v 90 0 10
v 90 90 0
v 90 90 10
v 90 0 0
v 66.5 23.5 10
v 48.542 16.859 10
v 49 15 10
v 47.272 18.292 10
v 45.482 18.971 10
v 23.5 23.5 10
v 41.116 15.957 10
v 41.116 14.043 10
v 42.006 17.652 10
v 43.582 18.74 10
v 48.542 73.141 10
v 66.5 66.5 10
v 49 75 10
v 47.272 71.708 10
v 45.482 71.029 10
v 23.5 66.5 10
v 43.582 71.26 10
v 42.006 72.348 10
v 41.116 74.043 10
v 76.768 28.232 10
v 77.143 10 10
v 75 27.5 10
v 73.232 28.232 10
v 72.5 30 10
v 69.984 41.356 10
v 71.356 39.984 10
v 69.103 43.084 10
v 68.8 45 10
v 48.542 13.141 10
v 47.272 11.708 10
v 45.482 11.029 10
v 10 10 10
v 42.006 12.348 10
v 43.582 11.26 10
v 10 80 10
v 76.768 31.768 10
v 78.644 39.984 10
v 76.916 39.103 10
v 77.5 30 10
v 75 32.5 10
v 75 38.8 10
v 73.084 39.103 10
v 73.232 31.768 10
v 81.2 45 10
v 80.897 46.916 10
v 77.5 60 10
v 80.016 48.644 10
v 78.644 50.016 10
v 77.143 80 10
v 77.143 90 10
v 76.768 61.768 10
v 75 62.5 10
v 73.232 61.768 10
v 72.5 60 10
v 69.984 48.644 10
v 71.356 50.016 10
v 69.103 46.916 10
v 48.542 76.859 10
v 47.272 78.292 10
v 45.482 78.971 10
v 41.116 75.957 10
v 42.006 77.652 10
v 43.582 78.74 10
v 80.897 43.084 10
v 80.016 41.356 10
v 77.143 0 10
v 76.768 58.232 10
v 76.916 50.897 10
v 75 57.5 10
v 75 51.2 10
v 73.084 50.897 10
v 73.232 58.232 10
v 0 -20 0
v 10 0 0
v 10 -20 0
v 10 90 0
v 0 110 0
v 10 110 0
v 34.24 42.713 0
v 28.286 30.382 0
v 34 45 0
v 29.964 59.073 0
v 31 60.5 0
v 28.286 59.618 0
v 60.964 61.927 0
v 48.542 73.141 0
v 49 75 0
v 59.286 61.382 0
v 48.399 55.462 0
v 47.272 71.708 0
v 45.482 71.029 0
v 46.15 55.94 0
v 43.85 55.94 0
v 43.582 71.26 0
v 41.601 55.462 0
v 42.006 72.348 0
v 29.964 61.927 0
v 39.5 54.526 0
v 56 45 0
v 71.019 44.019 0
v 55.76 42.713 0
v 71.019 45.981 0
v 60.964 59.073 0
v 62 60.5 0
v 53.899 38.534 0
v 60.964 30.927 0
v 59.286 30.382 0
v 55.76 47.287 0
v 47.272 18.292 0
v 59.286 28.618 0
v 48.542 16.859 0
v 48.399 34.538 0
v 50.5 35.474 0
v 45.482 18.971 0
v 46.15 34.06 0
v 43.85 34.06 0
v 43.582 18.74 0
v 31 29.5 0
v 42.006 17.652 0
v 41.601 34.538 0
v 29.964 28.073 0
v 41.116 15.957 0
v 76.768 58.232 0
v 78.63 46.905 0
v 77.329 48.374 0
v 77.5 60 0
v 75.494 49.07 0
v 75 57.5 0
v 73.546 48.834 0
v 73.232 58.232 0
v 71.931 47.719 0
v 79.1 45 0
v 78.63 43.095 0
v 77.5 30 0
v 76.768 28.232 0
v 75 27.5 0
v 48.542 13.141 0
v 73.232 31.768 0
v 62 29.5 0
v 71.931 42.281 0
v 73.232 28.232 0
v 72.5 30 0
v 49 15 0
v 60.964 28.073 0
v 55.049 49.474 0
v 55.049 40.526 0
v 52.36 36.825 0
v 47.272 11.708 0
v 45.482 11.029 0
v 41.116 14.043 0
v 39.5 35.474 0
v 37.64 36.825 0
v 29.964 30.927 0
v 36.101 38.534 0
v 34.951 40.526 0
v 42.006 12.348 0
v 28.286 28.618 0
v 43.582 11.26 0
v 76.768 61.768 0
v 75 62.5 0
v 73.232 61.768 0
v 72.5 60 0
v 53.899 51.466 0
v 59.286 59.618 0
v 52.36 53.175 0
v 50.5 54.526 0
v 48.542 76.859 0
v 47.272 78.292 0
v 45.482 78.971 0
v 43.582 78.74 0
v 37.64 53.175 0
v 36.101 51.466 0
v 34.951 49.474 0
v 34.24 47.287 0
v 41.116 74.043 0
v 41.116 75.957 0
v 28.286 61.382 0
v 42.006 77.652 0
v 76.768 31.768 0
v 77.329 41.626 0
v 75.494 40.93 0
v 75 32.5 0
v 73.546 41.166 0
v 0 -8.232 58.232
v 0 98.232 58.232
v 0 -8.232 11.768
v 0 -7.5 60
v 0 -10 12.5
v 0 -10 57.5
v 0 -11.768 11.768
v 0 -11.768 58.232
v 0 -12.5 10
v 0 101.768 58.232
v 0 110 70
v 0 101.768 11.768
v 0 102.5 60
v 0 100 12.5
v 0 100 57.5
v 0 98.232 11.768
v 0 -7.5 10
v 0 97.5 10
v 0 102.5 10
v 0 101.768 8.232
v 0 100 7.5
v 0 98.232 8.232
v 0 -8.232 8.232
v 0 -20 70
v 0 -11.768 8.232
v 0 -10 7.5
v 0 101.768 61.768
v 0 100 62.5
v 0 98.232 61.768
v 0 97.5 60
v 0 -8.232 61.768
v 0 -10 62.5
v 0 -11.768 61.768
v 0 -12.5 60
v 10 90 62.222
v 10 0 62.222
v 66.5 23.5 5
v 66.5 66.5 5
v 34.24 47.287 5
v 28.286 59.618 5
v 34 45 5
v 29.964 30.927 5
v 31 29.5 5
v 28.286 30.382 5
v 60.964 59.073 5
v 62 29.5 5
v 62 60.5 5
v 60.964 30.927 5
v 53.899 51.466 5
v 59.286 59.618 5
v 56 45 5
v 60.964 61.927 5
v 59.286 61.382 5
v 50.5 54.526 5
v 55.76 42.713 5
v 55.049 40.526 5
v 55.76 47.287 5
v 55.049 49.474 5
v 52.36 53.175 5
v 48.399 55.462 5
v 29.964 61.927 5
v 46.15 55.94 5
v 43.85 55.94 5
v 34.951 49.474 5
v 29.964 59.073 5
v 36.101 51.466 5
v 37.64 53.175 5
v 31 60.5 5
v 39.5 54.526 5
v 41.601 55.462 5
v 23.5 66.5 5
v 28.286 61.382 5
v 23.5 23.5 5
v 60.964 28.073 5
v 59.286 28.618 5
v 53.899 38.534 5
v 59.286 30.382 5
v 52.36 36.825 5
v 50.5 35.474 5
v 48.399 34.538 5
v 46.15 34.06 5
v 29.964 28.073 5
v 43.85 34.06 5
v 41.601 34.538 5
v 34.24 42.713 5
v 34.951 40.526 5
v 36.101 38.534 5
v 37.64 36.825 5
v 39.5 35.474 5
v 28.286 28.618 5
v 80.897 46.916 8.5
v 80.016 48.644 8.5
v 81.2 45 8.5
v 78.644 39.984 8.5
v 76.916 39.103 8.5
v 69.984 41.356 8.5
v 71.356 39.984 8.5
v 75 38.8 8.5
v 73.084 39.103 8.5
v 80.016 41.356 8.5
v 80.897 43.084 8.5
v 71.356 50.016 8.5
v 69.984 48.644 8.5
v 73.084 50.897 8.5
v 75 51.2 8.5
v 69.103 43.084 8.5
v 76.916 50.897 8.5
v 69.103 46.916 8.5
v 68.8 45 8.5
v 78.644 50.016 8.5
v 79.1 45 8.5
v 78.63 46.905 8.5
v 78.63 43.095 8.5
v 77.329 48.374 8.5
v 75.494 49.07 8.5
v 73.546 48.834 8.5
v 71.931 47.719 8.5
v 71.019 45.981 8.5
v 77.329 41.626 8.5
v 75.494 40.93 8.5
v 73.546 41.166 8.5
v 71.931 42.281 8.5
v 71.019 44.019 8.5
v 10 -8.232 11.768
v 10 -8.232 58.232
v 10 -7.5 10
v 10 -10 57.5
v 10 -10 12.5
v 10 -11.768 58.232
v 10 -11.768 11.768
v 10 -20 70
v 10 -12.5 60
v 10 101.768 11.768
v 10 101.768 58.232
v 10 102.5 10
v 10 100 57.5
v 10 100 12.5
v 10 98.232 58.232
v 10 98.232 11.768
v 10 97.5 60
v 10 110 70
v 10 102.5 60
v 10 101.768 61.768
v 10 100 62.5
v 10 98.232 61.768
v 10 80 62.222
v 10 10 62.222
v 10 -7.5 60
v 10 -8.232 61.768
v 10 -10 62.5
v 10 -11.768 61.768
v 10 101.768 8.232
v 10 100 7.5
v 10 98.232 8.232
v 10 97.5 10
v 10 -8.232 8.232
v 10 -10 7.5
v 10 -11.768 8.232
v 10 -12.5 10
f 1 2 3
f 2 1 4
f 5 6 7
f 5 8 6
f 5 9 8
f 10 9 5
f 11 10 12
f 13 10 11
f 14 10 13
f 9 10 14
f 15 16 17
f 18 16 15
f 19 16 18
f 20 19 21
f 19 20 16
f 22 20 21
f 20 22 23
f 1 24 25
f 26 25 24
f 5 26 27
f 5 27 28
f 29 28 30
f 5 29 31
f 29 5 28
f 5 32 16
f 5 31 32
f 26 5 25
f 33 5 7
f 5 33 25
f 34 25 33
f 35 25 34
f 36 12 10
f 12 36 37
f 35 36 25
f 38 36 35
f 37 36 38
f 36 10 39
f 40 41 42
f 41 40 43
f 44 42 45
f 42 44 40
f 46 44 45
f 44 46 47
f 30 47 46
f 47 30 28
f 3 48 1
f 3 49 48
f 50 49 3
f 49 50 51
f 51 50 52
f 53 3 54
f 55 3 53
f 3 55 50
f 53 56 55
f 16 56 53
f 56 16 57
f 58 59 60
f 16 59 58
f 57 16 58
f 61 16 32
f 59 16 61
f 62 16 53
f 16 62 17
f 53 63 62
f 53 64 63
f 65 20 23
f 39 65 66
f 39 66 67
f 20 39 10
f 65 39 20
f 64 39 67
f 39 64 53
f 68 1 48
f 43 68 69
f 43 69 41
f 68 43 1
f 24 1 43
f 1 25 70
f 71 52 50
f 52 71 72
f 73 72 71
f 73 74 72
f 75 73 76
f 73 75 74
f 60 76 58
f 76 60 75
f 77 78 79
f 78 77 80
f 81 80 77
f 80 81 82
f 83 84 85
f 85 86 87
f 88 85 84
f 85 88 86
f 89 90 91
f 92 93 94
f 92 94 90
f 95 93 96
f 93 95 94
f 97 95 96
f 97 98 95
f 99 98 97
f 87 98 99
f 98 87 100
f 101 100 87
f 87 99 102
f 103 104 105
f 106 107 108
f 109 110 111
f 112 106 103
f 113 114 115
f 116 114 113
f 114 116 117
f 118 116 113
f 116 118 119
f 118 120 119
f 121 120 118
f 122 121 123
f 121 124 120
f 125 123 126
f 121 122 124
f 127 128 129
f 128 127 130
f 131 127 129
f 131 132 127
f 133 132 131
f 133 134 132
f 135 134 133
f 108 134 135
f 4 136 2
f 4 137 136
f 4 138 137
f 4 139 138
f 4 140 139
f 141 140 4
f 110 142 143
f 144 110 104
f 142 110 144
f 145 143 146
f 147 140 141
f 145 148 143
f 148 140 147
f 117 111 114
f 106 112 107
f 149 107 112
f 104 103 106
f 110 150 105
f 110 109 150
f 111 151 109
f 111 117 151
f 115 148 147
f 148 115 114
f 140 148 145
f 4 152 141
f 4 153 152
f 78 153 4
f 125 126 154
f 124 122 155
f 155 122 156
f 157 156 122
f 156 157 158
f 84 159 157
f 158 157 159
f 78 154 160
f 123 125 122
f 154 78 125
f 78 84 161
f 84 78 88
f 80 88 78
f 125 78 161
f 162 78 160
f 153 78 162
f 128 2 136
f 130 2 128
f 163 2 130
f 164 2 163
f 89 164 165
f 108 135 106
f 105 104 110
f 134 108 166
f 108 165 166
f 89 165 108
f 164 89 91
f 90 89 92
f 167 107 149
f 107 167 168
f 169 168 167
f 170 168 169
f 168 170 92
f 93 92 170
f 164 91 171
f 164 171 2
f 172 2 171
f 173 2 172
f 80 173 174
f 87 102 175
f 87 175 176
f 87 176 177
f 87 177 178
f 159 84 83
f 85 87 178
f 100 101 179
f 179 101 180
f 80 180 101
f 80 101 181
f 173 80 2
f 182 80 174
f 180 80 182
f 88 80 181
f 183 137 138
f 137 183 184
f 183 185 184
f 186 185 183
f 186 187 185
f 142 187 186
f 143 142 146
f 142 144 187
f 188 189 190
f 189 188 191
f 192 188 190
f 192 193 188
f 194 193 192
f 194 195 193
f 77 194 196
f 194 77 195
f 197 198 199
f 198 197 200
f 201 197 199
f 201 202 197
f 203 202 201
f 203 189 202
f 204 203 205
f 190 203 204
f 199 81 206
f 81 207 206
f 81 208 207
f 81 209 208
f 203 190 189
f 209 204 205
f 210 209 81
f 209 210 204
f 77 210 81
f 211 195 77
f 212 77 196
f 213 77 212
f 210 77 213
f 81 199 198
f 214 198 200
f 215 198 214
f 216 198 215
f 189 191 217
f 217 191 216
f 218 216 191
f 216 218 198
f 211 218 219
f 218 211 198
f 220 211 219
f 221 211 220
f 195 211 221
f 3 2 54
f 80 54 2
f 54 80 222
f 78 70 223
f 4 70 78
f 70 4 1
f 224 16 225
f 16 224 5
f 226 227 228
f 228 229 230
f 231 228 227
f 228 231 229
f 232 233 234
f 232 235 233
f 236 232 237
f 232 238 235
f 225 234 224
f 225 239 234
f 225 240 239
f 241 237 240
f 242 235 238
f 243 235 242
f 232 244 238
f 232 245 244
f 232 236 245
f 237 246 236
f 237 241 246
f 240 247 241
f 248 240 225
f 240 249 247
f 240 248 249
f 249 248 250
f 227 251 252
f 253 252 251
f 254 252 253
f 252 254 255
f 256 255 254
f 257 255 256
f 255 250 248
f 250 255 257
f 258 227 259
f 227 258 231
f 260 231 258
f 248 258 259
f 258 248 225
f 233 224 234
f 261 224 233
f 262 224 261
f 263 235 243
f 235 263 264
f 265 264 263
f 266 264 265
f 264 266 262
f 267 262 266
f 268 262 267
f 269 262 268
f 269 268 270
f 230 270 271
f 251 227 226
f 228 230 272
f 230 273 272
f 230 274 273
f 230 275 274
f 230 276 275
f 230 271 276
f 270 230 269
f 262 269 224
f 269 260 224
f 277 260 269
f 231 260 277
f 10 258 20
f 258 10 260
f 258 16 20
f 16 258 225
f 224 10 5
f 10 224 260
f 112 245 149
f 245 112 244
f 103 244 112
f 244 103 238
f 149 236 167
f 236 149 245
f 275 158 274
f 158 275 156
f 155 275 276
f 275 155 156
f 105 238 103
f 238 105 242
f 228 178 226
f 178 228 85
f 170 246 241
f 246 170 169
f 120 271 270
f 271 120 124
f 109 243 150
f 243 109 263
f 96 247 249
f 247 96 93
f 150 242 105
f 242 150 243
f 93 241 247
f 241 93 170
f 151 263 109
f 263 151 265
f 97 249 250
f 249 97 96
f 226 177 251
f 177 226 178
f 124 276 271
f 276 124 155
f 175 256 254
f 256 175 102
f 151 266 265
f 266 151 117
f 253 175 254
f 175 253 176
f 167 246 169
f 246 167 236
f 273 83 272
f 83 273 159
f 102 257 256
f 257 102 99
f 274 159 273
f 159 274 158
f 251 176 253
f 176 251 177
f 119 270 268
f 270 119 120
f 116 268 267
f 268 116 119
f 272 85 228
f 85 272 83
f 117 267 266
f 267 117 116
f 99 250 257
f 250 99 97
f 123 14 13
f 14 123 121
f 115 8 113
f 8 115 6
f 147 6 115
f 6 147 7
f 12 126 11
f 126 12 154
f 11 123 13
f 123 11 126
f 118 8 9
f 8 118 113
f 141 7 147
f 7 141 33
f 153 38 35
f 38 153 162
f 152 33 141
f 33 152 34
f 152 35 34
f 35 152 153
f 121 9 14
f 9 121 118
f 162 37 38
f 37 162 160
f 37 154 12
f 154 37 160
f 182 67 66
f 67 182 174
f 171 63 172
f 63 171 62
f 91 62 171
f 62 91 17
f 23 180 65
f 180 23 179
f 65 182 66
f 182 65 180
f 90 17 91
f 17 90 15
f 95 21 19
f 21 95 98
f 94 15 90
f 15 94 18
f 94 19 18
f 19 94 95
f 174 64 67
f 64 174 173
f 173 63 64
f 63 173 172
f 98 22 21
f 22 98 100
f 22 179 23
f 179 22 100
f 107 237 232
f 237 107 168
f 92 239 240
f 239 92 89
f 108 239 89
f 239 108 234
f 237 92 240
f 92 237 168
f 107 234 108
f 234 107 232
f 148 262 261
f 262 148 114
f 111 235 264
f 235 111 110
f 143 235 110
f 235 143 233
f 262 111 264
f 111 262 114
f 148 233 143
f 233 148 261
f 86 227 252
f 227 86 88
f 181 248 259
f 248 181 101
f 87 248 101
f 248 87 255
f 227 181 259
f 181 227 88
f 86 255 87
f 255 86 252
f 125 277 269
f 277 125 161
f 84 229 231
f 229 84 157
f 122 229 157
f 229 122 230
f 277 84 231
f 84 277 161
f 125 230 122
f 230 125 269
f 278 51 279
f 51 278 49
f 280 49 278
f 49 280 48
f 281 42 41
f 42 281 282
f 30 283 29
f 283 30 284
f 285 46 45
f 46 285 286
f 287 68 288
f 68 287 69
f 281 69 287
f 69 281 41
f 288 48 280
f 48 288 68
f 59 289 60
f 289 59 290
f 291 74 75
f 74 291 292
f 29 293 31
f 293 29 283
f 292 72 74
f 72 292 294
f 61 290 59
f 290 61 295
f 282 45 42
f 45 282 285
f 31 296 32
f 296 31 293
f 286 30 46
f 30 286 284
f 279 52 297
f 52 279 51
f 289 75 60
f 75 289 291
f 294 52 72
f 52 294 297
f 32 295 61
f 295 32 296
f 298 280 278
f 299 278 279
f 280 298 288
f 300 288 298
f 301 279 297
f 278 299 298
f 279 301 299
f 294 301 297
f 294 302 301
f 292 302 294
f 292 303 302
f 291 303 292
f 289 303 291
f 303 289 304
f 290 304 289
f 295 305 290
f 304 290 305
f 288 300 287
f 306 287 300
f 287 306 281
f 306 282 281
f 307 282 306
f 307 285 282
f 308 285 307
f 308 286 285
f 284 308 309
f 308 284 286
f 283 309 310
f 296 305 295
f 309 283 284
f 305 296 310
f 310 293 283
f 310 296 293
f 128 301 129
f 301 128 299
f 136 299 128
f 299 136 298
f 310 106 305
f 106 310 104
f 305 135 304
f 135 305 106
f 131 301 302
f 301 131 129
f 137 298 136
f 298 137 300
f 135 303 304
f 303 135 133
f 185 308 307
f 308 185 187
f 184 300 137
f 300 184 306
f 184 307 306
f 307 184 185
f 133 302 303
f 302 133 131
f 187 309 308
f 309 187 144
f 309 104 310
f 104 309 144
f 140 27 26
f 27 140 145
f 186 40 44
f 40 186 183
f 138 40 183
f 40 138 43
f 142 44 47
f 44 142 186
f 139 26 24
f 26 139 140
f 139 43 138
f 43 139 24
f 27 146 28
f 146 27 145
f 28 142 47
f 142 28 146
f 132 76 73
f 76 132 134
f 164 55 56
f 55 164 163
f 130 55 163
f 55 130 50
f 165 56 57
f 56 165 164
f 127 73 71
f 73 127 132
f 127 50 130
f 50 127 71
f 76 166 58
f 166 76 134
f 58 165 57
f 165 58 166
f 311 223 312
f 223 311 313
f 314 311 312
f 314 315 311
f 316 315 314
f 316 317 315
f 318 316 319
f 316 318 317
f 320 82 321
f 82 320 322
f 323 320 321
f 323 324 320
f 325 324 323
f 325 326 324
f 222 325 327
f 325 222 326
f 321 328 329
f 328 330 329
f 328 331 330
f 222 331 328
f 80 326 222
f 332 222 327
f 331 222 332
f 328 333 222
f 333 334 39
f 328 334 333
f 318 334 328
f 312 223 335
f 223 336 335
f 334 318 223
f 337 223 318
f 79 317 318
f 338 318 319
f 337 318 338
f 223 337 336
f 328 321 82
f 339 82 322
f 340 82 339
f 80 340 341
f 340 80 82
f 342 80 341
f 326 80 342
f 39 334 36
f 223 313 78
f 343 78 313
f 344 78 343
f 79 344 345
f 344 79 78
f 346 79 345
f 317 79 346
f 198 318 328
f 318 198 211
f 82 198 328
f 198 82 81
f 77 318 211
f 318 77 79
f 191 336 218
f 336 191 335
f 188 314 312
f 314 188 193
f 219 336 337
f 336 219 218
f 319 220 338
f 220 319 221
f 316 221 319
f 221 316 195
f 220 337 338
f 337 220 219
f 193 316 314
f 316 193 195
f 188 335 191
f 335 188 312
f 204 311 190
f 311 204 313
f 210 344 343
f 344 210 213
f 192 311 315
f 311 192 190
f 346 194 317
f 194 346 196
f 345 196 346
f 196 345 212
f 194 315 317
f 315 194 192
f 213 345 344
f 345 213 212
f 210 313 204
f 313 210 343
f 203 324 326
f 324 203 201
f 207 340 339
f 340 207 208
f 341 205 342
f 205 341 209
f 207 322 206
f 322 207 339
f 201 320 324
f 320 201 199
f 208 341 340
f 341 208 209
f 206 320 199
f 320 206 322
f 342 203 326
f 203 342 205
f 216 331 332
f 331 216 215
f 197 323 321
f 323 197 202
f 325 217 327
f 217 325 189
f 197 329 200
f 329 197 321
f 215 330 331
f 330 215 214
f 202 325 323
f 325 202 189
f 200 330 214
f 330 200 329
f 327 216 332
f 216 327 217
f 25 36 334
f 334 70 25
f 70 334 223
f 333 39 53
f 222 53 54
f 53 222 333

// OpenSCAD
distscr=31/2;
cent=45;
rodrad=4;

difference(){
cube(size = [2*cent,2*cent,10], center =false);

translate(v=[cent-43/2,cent-43/2,5])
cube(size = [43,43,5], center =false);

translate(v=[cent,cent,0])
cylinder(h=5, r=11, center=false);

translate(v=[cent,15,0])
cylinder(h=20, r=rodrad, center=false);

translate(v=[cent,2*cent-15,0])
cylinder(h=20, r=rodrad, center=false);

translate(v=[cent+distscr,cent+distscr,0])
cylinder(h=50, r=1.5, center=false);

translate(v=[cent+distscr,cent-distscr,0])
cylinder(h=50, r=1.5, center=false);

translate(v=[cent-distscr,cent+distscr,0])
cylinder(h=50, r=1.5, center=false);

translate(v=[cent-distscr,cent-distscr,0])
cylinder(h=50, r=1.5, center=false);

translate(v=[2*cent-15,cent,8.5])
cylinder(h=1.5, r=6.2, center=false);

translate(v=[2*cent-15,cent,0])
cylinder(h=10, r=4.1, center=false);

translate(v=[2*cent-15,cent-15,0])
cylinder(h=10, r=2.5, center=false);

translate(v=[2*cent-15,cent+15,0])
cylinder(h=10, r=2.5, center=false);


}

difference(){
translate(v=[0,-20,0])
cube(size = [10,2*cent+40,70], center =false);

translate(v=[-10,-10,60])
rotate ([0,90,0]) 
cylinder(h=50, r=2.5, center=false);

translate(v=[-10,-10,10])
rotate ([0,90,0]) 
cylinder(h=50, r=2.5, center=false);

translate(v=[-10,2*cent+10,10])
rotate ([0,90,0]) 
cylinder(h=50, r=2.5, center=false);

translate(v=[-10,2*cent+10,60])
rotate ([0,90,0]) 
cylinder(h=50, r=2.5, center=false);
}

translate(v=[0,10,0])
rotate ([90,0,0]) 
linear_extrude(height = 10, center = false, convexity = 10, twist = 0, slices = 20) {
polygon(points=[[0,0],[2*cent,0],[0,70]],paths=[[0,1,2]]);}

translate(v=[0,2*cent,0])
rotate ([90,0,0]) 
linear_extrude(height = 10, center = false, convexity = 10, twist = 0, slices = 20) {
polygon(points=[[0,0],[2*cent,0],[0,70]],paths=[[0,1,2]]);}
